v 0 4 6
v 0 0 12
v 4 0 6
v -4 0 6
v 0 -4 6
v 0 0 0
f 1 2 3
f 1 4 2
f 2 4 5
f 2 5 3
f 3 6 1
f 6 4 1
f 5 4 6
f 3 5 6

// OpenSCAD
polyhedron(points = [[0, 4, 6], [0, 0, 12], [4, 0, 6], [-4, 0, 6], [0, -4, 6]],
          faces = [[0, 1, 2], [3, 1, 0], [4, 1, 3], [2, 1, 4], [4, 3, 0, 2]]);

polyhedron(points = [[0, 0, 0], [0, 4, 6], [4, 0, 6], [-4, -0, 6], [-0, -4, 6]],
          faces = [[0, 1, 2], [0, 3, 1], [0, 4, 3], [0, 2, 4], [2, 1, 3, 4]]);
